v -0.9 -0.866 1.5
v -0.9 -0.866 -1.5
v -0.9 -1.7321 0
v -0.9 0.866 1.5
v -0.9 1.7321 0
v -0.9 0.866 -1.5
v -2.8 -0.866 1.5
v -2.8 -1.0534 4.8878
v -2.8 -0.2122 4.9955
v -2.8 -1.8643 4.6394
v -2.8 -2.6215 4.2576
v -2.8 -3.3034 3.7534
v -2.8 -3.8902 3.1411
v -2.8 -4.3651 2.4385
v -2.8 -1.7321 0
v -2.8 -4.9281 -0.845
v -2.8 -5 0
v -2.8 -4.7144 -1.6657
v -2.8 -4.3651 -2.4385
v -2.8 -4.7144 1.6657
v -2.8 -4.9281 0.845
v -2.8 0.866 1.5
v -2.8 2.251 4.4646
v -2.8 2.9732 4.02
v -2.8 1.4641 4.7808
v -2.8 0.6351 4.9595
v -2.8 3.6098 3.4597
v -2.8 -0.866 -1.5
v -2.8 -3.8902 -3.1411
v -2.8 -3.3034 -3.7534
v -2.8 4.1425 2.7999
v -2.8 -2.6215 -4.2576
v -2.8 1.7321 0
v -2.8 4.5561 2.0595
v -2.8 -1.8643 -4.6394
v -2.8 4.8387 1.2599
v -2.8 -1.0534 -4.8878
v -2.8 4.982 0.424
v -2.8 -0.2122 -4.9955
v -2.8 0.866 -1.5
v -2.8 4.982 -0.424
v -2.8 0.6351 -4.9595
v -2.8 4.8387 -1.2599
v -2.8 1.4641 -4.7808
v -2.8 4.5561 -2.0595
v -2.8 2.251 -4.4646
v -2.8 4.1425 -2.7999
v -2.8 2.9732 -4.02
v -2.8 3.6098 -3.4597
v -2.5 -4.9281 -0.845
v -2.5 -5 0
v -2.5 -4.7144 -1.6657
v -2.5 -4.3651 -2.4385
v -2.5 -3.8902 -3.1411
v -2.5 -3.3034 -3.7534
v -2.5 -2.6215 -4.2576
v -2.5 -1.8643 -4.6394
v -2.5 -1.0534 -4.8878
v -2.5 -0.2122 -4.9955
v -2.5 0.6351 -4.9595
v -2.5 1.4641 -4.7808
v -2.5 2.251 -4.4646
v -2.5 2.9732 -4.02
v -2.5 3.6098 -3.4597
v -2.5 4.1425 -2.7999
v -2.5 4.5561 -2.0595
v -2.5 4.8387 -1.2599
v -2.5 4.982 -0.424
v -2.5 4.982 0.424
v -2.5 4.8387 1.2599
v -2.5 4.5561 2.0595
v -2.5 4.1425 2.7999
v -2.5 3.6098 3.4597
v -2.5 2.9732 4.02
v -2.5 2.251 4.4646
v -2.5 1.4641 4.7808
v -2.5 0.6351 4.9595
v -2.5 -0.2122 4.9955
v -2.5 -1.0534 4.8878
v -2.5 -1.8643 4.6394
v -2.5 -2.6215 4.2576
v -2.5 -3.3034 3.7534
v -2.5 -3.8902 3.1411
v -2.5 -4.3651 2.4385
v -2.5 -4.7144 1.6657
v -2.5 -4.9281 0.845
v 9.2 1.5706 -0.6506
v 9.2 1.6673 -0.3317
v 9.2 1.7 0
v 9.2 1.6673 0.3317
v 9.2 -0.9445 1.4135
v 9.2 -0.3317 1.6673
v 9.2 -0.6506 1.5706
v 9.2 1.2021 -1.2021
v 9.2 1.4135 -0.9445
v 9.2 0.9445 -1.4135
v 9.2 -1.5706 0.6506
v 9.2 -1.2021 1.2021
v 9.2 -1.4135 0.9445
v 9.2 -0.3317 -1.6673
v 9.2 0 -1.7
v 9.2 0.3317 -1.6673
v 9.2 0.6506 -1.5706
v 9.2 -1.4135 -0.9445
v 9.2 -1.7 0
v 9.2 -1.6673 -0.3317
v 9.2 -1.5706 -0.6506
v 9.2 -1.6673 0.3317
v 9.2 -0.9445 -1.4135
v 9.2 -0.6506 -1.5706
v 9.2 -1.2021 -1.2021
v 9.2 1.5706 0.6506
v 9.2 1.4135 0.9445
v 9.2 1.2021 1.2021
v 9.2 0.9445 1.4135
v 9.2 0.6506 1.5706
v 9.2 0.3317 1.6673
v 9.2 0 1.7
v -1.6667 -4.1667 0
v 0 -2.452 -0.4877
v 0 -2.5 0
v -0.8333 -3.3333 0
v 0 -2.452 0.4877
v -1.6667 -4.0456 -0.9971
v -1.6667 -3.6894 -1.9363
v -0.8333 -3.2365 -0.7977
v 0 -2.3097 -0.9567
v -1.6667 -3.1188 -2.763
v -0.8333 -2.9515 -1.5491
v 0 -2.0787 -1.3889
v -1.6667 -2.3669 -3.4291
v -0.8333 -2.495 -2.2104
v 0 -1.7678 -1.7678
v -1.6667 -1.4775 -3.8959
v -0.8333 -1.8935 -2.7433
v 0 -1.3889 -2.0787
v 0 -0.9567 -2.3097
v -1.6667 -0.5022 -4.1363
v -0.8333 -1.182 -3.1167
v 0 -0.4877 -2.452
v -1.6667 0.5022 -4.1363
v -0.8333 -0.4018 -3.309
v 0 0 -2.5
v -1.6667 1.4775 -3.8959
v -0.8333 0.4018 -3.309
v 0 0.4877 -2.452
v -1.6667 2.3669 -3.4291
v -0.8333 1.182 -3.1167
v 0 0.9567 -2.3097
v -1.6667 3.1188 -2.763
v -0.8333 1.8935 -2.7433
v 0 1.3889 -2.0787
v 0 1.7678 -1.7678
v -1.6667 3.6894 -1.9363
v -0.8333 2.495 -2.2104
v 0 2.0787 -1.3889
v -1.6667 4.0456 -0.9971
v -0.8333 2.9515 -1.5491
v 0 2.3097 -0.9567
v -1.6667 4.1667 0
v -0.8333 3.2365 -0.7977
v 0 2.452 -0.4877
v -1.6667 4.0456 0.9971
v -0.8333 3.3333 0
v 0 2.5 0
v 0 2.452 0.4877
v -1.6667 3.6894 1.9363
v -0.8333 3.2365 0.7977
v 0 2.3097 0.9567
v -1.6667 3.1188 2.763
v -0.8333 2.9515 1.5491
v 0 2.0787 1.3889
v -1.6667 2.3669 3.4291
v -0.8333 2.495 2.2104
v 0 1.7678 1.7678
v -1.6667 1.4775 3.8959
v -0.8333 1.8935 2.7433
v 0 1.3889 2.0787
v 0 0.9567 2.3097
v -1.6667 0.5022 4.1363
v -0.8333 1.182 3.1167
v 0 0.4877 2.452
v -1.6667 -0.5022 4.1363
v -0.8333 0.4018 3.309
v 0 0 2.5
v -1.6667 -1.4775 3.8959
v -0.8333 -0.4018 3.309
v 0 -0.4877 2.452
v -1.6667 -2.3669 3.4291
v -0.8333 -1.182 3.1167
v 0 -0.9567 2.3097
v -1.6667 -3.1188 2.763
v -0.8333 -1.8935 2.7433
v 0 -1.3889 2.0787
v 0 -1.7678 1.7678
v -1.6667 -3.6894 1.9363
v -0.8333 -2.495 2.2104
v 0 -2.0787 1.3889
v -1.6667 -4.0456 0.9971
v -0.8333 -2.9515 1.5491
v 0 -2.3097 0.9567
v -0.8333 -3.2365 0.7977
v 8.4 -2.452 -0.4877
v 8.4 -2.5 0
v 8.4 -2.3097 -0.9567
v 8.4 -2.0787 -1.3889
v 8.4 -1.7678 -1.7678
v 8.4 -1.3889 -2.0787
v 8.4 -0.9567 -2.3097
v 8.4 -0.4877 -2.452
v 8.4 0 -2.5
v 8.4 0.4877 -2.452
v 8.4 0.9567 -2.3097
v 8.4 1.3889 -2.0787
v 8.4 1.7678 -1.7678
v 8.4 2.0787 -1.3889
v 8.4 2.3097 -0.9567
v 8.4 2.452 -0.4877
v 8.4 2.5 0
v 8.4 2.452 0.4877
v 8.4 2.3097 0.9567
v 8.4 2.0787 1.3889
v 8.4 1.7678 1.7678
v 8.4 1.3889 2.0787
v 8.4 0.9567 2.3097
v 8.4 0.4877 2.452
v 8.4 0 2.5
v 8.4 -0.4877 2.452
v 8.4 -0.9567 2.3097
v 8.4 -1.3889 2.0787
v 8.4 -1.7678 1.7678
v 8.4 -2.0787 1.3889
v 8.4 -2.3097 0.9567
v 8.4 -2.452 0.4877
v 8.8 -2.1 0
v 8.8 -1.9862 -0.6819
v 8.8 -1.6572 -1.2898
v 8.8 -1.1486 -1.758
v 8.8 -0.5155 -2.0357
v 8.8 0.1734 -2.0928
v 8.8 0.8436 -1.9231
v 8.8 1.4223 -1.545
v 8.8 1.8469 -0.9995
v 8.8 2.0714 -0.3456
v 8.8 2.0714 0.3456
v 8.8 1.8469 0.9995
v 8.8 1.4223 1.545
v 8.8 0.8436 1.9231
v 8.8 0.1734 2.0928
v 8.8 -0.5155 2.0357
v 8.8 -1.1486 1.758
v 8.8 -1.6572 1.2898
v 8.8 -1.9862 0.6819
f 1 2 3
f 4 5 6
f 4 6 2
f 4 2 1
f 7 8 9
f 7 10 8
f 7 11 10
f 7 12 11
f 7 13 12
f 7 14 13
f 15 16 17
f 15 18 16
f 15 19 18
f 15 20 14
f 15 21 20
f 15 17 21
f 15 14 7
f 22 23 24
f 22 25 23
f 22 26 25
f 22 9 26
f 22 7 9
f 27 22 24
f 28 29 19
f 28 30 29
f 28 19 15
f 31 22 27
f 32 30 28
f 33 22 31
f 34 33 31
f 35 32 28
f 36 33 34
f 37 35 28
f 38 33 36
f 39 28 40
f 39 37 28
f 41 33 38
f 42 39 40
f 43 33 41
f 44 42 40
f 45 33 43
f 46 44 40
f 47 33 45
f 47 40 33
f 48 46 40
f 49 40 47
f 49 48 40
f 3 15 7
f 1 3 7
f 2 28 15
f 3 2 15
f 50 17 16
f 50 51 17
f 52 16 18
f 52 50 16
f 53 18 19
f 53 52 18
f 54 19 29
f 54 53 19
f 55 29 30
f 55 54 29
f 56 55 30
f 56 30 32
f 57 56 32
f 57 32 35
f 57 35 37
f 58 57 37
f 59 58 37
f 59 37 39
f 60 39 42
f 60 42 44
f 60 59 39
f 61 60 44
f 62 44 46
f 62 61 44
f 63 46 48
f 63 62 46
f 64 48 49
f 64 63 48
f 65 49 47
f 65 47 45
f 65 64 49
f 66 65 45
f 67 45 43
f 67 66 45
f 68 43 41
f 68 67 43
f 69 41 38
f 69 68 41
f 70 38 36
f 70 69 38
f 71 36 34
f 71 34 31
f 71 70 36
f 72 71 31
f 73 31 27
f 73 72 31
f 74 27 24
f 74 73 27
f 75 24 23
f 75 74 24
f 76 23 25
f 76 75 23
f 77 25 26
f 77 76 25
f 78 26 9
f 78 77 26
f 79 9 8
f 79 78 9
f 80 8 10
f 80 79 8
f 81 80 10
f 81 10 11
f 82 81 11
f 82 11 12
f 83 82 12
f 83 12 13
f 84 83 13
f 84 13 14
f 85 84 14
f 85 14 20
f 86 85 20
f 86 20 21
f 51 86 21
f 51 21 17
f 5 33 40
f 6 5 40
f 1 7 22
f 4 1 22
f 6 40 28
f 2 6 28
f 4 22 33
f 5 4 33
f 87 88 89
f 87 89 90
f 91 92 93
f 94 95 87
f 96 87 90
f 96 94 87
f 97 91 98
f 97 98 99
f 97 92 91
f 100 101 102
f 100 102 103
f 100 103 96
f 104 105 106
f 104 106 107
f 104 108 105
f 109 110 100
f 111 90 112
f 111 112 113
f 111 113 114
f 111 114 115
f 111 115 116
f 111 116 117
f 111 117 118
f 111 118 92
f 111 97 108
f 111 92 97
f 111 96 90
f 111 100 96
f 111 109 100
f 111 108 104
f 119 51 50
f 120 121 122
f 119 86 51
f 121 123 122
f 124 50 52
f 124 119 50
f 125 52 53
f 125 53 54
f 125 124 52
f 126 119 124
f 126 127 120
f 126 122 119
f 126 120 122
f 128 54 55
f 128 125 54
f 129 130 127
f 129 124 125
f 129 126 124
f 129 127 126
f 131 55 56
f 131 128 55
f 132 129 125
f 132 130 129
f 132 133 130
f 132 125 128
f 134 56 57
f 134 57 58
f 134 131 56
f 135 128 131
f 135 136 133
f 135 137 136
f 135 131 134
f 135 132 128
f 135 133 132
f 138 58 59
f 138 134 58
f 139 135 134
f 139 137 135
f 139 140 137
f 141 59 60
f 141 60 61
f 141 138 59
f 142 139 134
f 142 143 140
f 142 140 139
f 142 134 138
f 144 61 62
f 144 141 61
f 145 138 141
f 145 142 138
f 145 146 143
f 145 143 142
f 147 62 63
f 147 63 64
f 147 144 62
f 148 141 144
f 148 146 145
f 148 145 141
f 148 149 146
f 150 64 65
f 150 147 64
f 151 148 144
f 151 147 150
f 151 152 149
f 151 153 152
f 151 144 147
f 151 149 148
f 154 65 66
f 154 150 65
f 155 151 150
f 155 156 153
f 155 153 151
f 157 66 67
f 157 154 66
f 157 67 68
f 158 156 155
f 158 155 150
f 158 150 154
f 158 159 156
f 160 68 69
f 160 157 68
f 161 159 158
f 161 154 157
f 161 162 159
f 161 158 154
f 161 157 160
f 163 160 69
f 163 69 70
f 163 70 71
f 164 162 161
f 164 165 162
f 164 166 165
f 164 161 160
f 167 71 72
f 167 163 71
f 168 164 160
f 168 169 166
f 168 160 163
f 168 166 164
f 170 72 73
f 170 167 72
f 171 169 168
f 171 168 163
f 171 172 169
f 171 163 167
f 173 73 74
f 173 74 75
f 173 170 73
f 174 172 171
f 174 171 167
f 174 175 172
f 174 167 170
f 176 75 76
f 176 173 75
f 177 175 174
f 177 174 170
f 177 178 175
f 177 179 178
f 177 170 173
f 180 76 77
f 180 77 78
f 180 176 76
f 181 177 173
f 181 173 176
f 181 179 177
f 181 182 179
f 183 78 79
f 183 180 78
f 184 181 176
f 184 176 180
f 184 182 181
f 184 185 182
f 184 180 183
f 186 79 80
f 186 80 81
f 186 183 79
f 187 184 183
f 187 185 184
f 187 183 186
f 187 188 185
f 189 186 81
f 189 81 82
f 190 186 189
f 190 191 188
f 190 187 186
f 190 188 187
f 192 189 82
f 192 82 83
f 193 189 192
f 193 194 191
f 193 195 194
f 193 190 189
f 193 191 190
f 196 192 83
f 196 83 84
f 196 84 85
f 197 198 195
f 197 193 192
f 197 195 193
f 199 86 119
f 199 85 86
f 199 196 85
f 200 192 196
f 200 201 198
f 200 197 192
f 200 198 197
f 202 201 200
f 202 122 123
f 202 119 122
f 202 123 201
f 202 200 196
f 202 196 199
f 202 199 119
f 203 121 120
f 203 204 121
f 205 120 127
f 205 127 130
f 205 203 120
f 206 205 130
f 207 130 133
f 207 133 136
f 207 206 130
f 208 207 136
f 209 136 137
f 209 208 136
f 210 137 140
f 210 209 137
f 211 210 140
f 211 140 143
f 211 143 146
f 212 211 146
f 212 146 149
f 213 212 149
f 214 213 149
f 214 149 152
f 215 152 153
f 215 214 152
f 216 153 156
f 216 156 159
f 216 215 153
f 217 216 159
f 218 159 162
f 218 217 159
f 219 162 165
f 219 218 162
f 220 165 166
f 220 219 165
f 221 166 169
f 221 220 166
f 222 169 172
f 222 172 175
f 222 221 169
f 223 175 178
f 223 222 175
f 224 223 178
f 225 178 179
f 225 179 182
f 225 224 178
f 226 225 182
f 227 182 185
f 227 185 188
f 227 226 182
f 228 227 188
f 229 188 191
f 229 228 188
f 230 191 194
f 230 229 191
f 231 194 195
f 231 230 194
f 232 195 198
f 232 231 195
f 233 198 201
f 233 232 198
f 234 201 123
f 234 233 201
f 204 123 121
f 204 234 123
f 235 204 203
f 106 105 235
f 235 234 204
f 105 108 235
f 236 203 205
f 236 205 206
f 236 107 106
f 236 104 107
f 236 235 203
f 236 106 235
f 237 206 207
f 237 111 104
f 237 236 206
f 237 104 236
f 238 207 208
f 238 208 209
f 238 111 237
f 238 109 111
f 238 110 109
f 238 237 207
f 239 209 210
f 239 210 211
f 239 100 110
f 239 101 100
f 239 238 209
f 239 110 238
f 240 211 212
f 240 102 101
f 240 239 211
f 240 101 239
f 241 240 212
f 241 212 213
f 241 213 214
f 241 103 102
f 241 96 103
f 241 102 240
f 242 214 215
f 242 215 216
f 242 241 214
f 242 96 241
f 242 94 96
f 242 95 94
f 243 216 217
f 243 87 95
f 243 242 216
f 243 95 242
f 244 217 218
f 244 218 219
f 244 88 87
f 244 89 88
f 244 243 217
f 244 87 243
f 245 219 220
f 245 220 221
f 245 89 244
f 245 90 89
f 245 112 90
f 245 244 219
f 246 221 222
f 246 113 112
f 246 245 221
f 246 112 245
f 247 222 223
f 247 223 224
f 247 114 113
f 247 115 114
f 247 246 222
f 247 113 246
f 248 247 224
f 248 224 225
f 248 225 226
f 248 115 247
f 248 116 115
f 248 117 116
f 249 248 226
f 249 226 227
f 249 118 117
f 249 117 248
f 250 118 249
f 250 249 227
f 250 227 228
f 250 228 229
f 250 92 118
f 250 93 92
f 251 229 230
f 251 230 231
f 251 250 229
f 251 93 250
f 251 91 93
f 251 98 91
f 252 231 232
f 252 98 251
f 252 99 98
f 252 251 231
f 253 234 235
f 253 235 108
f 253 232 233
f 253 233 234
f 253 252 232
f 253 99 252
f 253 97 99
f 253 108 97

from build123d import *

# Parameters (mm, degrees)
CUT_EXTRUDE1_DEPTH = 1.9


with BuildPart() as part:
    # Sketch1 → Revolve1 (revolve)
    with BuildSketch(Plane.XY):
        Polygon((0, -2.5), (8.4, -2.5), (9.2, -1.7), (9.2, 0), (-2.8, 0), (-2.8, -5), (-2.5, -5), align=None)
    revolve(axis=Axis((-2.8, 0, 0), (1, 0, 0)))

    # Sketch2 → Cut-Extrude1 (cut)
    with BuildSketch(Plane.ZY.offset(2.8)):
        Polygon((0, 1.732050808), (-1.5, 0.866025404), (-1.5, -0.866025404), (0, -1.732050808), (1.5, -0.866025404), (1.5, 0.866025404), align=None)
    extrude(amount=-CUT_EXTRUDE1_DEPTH, mode=Mode.SUBTRACT)


solid = part.part
